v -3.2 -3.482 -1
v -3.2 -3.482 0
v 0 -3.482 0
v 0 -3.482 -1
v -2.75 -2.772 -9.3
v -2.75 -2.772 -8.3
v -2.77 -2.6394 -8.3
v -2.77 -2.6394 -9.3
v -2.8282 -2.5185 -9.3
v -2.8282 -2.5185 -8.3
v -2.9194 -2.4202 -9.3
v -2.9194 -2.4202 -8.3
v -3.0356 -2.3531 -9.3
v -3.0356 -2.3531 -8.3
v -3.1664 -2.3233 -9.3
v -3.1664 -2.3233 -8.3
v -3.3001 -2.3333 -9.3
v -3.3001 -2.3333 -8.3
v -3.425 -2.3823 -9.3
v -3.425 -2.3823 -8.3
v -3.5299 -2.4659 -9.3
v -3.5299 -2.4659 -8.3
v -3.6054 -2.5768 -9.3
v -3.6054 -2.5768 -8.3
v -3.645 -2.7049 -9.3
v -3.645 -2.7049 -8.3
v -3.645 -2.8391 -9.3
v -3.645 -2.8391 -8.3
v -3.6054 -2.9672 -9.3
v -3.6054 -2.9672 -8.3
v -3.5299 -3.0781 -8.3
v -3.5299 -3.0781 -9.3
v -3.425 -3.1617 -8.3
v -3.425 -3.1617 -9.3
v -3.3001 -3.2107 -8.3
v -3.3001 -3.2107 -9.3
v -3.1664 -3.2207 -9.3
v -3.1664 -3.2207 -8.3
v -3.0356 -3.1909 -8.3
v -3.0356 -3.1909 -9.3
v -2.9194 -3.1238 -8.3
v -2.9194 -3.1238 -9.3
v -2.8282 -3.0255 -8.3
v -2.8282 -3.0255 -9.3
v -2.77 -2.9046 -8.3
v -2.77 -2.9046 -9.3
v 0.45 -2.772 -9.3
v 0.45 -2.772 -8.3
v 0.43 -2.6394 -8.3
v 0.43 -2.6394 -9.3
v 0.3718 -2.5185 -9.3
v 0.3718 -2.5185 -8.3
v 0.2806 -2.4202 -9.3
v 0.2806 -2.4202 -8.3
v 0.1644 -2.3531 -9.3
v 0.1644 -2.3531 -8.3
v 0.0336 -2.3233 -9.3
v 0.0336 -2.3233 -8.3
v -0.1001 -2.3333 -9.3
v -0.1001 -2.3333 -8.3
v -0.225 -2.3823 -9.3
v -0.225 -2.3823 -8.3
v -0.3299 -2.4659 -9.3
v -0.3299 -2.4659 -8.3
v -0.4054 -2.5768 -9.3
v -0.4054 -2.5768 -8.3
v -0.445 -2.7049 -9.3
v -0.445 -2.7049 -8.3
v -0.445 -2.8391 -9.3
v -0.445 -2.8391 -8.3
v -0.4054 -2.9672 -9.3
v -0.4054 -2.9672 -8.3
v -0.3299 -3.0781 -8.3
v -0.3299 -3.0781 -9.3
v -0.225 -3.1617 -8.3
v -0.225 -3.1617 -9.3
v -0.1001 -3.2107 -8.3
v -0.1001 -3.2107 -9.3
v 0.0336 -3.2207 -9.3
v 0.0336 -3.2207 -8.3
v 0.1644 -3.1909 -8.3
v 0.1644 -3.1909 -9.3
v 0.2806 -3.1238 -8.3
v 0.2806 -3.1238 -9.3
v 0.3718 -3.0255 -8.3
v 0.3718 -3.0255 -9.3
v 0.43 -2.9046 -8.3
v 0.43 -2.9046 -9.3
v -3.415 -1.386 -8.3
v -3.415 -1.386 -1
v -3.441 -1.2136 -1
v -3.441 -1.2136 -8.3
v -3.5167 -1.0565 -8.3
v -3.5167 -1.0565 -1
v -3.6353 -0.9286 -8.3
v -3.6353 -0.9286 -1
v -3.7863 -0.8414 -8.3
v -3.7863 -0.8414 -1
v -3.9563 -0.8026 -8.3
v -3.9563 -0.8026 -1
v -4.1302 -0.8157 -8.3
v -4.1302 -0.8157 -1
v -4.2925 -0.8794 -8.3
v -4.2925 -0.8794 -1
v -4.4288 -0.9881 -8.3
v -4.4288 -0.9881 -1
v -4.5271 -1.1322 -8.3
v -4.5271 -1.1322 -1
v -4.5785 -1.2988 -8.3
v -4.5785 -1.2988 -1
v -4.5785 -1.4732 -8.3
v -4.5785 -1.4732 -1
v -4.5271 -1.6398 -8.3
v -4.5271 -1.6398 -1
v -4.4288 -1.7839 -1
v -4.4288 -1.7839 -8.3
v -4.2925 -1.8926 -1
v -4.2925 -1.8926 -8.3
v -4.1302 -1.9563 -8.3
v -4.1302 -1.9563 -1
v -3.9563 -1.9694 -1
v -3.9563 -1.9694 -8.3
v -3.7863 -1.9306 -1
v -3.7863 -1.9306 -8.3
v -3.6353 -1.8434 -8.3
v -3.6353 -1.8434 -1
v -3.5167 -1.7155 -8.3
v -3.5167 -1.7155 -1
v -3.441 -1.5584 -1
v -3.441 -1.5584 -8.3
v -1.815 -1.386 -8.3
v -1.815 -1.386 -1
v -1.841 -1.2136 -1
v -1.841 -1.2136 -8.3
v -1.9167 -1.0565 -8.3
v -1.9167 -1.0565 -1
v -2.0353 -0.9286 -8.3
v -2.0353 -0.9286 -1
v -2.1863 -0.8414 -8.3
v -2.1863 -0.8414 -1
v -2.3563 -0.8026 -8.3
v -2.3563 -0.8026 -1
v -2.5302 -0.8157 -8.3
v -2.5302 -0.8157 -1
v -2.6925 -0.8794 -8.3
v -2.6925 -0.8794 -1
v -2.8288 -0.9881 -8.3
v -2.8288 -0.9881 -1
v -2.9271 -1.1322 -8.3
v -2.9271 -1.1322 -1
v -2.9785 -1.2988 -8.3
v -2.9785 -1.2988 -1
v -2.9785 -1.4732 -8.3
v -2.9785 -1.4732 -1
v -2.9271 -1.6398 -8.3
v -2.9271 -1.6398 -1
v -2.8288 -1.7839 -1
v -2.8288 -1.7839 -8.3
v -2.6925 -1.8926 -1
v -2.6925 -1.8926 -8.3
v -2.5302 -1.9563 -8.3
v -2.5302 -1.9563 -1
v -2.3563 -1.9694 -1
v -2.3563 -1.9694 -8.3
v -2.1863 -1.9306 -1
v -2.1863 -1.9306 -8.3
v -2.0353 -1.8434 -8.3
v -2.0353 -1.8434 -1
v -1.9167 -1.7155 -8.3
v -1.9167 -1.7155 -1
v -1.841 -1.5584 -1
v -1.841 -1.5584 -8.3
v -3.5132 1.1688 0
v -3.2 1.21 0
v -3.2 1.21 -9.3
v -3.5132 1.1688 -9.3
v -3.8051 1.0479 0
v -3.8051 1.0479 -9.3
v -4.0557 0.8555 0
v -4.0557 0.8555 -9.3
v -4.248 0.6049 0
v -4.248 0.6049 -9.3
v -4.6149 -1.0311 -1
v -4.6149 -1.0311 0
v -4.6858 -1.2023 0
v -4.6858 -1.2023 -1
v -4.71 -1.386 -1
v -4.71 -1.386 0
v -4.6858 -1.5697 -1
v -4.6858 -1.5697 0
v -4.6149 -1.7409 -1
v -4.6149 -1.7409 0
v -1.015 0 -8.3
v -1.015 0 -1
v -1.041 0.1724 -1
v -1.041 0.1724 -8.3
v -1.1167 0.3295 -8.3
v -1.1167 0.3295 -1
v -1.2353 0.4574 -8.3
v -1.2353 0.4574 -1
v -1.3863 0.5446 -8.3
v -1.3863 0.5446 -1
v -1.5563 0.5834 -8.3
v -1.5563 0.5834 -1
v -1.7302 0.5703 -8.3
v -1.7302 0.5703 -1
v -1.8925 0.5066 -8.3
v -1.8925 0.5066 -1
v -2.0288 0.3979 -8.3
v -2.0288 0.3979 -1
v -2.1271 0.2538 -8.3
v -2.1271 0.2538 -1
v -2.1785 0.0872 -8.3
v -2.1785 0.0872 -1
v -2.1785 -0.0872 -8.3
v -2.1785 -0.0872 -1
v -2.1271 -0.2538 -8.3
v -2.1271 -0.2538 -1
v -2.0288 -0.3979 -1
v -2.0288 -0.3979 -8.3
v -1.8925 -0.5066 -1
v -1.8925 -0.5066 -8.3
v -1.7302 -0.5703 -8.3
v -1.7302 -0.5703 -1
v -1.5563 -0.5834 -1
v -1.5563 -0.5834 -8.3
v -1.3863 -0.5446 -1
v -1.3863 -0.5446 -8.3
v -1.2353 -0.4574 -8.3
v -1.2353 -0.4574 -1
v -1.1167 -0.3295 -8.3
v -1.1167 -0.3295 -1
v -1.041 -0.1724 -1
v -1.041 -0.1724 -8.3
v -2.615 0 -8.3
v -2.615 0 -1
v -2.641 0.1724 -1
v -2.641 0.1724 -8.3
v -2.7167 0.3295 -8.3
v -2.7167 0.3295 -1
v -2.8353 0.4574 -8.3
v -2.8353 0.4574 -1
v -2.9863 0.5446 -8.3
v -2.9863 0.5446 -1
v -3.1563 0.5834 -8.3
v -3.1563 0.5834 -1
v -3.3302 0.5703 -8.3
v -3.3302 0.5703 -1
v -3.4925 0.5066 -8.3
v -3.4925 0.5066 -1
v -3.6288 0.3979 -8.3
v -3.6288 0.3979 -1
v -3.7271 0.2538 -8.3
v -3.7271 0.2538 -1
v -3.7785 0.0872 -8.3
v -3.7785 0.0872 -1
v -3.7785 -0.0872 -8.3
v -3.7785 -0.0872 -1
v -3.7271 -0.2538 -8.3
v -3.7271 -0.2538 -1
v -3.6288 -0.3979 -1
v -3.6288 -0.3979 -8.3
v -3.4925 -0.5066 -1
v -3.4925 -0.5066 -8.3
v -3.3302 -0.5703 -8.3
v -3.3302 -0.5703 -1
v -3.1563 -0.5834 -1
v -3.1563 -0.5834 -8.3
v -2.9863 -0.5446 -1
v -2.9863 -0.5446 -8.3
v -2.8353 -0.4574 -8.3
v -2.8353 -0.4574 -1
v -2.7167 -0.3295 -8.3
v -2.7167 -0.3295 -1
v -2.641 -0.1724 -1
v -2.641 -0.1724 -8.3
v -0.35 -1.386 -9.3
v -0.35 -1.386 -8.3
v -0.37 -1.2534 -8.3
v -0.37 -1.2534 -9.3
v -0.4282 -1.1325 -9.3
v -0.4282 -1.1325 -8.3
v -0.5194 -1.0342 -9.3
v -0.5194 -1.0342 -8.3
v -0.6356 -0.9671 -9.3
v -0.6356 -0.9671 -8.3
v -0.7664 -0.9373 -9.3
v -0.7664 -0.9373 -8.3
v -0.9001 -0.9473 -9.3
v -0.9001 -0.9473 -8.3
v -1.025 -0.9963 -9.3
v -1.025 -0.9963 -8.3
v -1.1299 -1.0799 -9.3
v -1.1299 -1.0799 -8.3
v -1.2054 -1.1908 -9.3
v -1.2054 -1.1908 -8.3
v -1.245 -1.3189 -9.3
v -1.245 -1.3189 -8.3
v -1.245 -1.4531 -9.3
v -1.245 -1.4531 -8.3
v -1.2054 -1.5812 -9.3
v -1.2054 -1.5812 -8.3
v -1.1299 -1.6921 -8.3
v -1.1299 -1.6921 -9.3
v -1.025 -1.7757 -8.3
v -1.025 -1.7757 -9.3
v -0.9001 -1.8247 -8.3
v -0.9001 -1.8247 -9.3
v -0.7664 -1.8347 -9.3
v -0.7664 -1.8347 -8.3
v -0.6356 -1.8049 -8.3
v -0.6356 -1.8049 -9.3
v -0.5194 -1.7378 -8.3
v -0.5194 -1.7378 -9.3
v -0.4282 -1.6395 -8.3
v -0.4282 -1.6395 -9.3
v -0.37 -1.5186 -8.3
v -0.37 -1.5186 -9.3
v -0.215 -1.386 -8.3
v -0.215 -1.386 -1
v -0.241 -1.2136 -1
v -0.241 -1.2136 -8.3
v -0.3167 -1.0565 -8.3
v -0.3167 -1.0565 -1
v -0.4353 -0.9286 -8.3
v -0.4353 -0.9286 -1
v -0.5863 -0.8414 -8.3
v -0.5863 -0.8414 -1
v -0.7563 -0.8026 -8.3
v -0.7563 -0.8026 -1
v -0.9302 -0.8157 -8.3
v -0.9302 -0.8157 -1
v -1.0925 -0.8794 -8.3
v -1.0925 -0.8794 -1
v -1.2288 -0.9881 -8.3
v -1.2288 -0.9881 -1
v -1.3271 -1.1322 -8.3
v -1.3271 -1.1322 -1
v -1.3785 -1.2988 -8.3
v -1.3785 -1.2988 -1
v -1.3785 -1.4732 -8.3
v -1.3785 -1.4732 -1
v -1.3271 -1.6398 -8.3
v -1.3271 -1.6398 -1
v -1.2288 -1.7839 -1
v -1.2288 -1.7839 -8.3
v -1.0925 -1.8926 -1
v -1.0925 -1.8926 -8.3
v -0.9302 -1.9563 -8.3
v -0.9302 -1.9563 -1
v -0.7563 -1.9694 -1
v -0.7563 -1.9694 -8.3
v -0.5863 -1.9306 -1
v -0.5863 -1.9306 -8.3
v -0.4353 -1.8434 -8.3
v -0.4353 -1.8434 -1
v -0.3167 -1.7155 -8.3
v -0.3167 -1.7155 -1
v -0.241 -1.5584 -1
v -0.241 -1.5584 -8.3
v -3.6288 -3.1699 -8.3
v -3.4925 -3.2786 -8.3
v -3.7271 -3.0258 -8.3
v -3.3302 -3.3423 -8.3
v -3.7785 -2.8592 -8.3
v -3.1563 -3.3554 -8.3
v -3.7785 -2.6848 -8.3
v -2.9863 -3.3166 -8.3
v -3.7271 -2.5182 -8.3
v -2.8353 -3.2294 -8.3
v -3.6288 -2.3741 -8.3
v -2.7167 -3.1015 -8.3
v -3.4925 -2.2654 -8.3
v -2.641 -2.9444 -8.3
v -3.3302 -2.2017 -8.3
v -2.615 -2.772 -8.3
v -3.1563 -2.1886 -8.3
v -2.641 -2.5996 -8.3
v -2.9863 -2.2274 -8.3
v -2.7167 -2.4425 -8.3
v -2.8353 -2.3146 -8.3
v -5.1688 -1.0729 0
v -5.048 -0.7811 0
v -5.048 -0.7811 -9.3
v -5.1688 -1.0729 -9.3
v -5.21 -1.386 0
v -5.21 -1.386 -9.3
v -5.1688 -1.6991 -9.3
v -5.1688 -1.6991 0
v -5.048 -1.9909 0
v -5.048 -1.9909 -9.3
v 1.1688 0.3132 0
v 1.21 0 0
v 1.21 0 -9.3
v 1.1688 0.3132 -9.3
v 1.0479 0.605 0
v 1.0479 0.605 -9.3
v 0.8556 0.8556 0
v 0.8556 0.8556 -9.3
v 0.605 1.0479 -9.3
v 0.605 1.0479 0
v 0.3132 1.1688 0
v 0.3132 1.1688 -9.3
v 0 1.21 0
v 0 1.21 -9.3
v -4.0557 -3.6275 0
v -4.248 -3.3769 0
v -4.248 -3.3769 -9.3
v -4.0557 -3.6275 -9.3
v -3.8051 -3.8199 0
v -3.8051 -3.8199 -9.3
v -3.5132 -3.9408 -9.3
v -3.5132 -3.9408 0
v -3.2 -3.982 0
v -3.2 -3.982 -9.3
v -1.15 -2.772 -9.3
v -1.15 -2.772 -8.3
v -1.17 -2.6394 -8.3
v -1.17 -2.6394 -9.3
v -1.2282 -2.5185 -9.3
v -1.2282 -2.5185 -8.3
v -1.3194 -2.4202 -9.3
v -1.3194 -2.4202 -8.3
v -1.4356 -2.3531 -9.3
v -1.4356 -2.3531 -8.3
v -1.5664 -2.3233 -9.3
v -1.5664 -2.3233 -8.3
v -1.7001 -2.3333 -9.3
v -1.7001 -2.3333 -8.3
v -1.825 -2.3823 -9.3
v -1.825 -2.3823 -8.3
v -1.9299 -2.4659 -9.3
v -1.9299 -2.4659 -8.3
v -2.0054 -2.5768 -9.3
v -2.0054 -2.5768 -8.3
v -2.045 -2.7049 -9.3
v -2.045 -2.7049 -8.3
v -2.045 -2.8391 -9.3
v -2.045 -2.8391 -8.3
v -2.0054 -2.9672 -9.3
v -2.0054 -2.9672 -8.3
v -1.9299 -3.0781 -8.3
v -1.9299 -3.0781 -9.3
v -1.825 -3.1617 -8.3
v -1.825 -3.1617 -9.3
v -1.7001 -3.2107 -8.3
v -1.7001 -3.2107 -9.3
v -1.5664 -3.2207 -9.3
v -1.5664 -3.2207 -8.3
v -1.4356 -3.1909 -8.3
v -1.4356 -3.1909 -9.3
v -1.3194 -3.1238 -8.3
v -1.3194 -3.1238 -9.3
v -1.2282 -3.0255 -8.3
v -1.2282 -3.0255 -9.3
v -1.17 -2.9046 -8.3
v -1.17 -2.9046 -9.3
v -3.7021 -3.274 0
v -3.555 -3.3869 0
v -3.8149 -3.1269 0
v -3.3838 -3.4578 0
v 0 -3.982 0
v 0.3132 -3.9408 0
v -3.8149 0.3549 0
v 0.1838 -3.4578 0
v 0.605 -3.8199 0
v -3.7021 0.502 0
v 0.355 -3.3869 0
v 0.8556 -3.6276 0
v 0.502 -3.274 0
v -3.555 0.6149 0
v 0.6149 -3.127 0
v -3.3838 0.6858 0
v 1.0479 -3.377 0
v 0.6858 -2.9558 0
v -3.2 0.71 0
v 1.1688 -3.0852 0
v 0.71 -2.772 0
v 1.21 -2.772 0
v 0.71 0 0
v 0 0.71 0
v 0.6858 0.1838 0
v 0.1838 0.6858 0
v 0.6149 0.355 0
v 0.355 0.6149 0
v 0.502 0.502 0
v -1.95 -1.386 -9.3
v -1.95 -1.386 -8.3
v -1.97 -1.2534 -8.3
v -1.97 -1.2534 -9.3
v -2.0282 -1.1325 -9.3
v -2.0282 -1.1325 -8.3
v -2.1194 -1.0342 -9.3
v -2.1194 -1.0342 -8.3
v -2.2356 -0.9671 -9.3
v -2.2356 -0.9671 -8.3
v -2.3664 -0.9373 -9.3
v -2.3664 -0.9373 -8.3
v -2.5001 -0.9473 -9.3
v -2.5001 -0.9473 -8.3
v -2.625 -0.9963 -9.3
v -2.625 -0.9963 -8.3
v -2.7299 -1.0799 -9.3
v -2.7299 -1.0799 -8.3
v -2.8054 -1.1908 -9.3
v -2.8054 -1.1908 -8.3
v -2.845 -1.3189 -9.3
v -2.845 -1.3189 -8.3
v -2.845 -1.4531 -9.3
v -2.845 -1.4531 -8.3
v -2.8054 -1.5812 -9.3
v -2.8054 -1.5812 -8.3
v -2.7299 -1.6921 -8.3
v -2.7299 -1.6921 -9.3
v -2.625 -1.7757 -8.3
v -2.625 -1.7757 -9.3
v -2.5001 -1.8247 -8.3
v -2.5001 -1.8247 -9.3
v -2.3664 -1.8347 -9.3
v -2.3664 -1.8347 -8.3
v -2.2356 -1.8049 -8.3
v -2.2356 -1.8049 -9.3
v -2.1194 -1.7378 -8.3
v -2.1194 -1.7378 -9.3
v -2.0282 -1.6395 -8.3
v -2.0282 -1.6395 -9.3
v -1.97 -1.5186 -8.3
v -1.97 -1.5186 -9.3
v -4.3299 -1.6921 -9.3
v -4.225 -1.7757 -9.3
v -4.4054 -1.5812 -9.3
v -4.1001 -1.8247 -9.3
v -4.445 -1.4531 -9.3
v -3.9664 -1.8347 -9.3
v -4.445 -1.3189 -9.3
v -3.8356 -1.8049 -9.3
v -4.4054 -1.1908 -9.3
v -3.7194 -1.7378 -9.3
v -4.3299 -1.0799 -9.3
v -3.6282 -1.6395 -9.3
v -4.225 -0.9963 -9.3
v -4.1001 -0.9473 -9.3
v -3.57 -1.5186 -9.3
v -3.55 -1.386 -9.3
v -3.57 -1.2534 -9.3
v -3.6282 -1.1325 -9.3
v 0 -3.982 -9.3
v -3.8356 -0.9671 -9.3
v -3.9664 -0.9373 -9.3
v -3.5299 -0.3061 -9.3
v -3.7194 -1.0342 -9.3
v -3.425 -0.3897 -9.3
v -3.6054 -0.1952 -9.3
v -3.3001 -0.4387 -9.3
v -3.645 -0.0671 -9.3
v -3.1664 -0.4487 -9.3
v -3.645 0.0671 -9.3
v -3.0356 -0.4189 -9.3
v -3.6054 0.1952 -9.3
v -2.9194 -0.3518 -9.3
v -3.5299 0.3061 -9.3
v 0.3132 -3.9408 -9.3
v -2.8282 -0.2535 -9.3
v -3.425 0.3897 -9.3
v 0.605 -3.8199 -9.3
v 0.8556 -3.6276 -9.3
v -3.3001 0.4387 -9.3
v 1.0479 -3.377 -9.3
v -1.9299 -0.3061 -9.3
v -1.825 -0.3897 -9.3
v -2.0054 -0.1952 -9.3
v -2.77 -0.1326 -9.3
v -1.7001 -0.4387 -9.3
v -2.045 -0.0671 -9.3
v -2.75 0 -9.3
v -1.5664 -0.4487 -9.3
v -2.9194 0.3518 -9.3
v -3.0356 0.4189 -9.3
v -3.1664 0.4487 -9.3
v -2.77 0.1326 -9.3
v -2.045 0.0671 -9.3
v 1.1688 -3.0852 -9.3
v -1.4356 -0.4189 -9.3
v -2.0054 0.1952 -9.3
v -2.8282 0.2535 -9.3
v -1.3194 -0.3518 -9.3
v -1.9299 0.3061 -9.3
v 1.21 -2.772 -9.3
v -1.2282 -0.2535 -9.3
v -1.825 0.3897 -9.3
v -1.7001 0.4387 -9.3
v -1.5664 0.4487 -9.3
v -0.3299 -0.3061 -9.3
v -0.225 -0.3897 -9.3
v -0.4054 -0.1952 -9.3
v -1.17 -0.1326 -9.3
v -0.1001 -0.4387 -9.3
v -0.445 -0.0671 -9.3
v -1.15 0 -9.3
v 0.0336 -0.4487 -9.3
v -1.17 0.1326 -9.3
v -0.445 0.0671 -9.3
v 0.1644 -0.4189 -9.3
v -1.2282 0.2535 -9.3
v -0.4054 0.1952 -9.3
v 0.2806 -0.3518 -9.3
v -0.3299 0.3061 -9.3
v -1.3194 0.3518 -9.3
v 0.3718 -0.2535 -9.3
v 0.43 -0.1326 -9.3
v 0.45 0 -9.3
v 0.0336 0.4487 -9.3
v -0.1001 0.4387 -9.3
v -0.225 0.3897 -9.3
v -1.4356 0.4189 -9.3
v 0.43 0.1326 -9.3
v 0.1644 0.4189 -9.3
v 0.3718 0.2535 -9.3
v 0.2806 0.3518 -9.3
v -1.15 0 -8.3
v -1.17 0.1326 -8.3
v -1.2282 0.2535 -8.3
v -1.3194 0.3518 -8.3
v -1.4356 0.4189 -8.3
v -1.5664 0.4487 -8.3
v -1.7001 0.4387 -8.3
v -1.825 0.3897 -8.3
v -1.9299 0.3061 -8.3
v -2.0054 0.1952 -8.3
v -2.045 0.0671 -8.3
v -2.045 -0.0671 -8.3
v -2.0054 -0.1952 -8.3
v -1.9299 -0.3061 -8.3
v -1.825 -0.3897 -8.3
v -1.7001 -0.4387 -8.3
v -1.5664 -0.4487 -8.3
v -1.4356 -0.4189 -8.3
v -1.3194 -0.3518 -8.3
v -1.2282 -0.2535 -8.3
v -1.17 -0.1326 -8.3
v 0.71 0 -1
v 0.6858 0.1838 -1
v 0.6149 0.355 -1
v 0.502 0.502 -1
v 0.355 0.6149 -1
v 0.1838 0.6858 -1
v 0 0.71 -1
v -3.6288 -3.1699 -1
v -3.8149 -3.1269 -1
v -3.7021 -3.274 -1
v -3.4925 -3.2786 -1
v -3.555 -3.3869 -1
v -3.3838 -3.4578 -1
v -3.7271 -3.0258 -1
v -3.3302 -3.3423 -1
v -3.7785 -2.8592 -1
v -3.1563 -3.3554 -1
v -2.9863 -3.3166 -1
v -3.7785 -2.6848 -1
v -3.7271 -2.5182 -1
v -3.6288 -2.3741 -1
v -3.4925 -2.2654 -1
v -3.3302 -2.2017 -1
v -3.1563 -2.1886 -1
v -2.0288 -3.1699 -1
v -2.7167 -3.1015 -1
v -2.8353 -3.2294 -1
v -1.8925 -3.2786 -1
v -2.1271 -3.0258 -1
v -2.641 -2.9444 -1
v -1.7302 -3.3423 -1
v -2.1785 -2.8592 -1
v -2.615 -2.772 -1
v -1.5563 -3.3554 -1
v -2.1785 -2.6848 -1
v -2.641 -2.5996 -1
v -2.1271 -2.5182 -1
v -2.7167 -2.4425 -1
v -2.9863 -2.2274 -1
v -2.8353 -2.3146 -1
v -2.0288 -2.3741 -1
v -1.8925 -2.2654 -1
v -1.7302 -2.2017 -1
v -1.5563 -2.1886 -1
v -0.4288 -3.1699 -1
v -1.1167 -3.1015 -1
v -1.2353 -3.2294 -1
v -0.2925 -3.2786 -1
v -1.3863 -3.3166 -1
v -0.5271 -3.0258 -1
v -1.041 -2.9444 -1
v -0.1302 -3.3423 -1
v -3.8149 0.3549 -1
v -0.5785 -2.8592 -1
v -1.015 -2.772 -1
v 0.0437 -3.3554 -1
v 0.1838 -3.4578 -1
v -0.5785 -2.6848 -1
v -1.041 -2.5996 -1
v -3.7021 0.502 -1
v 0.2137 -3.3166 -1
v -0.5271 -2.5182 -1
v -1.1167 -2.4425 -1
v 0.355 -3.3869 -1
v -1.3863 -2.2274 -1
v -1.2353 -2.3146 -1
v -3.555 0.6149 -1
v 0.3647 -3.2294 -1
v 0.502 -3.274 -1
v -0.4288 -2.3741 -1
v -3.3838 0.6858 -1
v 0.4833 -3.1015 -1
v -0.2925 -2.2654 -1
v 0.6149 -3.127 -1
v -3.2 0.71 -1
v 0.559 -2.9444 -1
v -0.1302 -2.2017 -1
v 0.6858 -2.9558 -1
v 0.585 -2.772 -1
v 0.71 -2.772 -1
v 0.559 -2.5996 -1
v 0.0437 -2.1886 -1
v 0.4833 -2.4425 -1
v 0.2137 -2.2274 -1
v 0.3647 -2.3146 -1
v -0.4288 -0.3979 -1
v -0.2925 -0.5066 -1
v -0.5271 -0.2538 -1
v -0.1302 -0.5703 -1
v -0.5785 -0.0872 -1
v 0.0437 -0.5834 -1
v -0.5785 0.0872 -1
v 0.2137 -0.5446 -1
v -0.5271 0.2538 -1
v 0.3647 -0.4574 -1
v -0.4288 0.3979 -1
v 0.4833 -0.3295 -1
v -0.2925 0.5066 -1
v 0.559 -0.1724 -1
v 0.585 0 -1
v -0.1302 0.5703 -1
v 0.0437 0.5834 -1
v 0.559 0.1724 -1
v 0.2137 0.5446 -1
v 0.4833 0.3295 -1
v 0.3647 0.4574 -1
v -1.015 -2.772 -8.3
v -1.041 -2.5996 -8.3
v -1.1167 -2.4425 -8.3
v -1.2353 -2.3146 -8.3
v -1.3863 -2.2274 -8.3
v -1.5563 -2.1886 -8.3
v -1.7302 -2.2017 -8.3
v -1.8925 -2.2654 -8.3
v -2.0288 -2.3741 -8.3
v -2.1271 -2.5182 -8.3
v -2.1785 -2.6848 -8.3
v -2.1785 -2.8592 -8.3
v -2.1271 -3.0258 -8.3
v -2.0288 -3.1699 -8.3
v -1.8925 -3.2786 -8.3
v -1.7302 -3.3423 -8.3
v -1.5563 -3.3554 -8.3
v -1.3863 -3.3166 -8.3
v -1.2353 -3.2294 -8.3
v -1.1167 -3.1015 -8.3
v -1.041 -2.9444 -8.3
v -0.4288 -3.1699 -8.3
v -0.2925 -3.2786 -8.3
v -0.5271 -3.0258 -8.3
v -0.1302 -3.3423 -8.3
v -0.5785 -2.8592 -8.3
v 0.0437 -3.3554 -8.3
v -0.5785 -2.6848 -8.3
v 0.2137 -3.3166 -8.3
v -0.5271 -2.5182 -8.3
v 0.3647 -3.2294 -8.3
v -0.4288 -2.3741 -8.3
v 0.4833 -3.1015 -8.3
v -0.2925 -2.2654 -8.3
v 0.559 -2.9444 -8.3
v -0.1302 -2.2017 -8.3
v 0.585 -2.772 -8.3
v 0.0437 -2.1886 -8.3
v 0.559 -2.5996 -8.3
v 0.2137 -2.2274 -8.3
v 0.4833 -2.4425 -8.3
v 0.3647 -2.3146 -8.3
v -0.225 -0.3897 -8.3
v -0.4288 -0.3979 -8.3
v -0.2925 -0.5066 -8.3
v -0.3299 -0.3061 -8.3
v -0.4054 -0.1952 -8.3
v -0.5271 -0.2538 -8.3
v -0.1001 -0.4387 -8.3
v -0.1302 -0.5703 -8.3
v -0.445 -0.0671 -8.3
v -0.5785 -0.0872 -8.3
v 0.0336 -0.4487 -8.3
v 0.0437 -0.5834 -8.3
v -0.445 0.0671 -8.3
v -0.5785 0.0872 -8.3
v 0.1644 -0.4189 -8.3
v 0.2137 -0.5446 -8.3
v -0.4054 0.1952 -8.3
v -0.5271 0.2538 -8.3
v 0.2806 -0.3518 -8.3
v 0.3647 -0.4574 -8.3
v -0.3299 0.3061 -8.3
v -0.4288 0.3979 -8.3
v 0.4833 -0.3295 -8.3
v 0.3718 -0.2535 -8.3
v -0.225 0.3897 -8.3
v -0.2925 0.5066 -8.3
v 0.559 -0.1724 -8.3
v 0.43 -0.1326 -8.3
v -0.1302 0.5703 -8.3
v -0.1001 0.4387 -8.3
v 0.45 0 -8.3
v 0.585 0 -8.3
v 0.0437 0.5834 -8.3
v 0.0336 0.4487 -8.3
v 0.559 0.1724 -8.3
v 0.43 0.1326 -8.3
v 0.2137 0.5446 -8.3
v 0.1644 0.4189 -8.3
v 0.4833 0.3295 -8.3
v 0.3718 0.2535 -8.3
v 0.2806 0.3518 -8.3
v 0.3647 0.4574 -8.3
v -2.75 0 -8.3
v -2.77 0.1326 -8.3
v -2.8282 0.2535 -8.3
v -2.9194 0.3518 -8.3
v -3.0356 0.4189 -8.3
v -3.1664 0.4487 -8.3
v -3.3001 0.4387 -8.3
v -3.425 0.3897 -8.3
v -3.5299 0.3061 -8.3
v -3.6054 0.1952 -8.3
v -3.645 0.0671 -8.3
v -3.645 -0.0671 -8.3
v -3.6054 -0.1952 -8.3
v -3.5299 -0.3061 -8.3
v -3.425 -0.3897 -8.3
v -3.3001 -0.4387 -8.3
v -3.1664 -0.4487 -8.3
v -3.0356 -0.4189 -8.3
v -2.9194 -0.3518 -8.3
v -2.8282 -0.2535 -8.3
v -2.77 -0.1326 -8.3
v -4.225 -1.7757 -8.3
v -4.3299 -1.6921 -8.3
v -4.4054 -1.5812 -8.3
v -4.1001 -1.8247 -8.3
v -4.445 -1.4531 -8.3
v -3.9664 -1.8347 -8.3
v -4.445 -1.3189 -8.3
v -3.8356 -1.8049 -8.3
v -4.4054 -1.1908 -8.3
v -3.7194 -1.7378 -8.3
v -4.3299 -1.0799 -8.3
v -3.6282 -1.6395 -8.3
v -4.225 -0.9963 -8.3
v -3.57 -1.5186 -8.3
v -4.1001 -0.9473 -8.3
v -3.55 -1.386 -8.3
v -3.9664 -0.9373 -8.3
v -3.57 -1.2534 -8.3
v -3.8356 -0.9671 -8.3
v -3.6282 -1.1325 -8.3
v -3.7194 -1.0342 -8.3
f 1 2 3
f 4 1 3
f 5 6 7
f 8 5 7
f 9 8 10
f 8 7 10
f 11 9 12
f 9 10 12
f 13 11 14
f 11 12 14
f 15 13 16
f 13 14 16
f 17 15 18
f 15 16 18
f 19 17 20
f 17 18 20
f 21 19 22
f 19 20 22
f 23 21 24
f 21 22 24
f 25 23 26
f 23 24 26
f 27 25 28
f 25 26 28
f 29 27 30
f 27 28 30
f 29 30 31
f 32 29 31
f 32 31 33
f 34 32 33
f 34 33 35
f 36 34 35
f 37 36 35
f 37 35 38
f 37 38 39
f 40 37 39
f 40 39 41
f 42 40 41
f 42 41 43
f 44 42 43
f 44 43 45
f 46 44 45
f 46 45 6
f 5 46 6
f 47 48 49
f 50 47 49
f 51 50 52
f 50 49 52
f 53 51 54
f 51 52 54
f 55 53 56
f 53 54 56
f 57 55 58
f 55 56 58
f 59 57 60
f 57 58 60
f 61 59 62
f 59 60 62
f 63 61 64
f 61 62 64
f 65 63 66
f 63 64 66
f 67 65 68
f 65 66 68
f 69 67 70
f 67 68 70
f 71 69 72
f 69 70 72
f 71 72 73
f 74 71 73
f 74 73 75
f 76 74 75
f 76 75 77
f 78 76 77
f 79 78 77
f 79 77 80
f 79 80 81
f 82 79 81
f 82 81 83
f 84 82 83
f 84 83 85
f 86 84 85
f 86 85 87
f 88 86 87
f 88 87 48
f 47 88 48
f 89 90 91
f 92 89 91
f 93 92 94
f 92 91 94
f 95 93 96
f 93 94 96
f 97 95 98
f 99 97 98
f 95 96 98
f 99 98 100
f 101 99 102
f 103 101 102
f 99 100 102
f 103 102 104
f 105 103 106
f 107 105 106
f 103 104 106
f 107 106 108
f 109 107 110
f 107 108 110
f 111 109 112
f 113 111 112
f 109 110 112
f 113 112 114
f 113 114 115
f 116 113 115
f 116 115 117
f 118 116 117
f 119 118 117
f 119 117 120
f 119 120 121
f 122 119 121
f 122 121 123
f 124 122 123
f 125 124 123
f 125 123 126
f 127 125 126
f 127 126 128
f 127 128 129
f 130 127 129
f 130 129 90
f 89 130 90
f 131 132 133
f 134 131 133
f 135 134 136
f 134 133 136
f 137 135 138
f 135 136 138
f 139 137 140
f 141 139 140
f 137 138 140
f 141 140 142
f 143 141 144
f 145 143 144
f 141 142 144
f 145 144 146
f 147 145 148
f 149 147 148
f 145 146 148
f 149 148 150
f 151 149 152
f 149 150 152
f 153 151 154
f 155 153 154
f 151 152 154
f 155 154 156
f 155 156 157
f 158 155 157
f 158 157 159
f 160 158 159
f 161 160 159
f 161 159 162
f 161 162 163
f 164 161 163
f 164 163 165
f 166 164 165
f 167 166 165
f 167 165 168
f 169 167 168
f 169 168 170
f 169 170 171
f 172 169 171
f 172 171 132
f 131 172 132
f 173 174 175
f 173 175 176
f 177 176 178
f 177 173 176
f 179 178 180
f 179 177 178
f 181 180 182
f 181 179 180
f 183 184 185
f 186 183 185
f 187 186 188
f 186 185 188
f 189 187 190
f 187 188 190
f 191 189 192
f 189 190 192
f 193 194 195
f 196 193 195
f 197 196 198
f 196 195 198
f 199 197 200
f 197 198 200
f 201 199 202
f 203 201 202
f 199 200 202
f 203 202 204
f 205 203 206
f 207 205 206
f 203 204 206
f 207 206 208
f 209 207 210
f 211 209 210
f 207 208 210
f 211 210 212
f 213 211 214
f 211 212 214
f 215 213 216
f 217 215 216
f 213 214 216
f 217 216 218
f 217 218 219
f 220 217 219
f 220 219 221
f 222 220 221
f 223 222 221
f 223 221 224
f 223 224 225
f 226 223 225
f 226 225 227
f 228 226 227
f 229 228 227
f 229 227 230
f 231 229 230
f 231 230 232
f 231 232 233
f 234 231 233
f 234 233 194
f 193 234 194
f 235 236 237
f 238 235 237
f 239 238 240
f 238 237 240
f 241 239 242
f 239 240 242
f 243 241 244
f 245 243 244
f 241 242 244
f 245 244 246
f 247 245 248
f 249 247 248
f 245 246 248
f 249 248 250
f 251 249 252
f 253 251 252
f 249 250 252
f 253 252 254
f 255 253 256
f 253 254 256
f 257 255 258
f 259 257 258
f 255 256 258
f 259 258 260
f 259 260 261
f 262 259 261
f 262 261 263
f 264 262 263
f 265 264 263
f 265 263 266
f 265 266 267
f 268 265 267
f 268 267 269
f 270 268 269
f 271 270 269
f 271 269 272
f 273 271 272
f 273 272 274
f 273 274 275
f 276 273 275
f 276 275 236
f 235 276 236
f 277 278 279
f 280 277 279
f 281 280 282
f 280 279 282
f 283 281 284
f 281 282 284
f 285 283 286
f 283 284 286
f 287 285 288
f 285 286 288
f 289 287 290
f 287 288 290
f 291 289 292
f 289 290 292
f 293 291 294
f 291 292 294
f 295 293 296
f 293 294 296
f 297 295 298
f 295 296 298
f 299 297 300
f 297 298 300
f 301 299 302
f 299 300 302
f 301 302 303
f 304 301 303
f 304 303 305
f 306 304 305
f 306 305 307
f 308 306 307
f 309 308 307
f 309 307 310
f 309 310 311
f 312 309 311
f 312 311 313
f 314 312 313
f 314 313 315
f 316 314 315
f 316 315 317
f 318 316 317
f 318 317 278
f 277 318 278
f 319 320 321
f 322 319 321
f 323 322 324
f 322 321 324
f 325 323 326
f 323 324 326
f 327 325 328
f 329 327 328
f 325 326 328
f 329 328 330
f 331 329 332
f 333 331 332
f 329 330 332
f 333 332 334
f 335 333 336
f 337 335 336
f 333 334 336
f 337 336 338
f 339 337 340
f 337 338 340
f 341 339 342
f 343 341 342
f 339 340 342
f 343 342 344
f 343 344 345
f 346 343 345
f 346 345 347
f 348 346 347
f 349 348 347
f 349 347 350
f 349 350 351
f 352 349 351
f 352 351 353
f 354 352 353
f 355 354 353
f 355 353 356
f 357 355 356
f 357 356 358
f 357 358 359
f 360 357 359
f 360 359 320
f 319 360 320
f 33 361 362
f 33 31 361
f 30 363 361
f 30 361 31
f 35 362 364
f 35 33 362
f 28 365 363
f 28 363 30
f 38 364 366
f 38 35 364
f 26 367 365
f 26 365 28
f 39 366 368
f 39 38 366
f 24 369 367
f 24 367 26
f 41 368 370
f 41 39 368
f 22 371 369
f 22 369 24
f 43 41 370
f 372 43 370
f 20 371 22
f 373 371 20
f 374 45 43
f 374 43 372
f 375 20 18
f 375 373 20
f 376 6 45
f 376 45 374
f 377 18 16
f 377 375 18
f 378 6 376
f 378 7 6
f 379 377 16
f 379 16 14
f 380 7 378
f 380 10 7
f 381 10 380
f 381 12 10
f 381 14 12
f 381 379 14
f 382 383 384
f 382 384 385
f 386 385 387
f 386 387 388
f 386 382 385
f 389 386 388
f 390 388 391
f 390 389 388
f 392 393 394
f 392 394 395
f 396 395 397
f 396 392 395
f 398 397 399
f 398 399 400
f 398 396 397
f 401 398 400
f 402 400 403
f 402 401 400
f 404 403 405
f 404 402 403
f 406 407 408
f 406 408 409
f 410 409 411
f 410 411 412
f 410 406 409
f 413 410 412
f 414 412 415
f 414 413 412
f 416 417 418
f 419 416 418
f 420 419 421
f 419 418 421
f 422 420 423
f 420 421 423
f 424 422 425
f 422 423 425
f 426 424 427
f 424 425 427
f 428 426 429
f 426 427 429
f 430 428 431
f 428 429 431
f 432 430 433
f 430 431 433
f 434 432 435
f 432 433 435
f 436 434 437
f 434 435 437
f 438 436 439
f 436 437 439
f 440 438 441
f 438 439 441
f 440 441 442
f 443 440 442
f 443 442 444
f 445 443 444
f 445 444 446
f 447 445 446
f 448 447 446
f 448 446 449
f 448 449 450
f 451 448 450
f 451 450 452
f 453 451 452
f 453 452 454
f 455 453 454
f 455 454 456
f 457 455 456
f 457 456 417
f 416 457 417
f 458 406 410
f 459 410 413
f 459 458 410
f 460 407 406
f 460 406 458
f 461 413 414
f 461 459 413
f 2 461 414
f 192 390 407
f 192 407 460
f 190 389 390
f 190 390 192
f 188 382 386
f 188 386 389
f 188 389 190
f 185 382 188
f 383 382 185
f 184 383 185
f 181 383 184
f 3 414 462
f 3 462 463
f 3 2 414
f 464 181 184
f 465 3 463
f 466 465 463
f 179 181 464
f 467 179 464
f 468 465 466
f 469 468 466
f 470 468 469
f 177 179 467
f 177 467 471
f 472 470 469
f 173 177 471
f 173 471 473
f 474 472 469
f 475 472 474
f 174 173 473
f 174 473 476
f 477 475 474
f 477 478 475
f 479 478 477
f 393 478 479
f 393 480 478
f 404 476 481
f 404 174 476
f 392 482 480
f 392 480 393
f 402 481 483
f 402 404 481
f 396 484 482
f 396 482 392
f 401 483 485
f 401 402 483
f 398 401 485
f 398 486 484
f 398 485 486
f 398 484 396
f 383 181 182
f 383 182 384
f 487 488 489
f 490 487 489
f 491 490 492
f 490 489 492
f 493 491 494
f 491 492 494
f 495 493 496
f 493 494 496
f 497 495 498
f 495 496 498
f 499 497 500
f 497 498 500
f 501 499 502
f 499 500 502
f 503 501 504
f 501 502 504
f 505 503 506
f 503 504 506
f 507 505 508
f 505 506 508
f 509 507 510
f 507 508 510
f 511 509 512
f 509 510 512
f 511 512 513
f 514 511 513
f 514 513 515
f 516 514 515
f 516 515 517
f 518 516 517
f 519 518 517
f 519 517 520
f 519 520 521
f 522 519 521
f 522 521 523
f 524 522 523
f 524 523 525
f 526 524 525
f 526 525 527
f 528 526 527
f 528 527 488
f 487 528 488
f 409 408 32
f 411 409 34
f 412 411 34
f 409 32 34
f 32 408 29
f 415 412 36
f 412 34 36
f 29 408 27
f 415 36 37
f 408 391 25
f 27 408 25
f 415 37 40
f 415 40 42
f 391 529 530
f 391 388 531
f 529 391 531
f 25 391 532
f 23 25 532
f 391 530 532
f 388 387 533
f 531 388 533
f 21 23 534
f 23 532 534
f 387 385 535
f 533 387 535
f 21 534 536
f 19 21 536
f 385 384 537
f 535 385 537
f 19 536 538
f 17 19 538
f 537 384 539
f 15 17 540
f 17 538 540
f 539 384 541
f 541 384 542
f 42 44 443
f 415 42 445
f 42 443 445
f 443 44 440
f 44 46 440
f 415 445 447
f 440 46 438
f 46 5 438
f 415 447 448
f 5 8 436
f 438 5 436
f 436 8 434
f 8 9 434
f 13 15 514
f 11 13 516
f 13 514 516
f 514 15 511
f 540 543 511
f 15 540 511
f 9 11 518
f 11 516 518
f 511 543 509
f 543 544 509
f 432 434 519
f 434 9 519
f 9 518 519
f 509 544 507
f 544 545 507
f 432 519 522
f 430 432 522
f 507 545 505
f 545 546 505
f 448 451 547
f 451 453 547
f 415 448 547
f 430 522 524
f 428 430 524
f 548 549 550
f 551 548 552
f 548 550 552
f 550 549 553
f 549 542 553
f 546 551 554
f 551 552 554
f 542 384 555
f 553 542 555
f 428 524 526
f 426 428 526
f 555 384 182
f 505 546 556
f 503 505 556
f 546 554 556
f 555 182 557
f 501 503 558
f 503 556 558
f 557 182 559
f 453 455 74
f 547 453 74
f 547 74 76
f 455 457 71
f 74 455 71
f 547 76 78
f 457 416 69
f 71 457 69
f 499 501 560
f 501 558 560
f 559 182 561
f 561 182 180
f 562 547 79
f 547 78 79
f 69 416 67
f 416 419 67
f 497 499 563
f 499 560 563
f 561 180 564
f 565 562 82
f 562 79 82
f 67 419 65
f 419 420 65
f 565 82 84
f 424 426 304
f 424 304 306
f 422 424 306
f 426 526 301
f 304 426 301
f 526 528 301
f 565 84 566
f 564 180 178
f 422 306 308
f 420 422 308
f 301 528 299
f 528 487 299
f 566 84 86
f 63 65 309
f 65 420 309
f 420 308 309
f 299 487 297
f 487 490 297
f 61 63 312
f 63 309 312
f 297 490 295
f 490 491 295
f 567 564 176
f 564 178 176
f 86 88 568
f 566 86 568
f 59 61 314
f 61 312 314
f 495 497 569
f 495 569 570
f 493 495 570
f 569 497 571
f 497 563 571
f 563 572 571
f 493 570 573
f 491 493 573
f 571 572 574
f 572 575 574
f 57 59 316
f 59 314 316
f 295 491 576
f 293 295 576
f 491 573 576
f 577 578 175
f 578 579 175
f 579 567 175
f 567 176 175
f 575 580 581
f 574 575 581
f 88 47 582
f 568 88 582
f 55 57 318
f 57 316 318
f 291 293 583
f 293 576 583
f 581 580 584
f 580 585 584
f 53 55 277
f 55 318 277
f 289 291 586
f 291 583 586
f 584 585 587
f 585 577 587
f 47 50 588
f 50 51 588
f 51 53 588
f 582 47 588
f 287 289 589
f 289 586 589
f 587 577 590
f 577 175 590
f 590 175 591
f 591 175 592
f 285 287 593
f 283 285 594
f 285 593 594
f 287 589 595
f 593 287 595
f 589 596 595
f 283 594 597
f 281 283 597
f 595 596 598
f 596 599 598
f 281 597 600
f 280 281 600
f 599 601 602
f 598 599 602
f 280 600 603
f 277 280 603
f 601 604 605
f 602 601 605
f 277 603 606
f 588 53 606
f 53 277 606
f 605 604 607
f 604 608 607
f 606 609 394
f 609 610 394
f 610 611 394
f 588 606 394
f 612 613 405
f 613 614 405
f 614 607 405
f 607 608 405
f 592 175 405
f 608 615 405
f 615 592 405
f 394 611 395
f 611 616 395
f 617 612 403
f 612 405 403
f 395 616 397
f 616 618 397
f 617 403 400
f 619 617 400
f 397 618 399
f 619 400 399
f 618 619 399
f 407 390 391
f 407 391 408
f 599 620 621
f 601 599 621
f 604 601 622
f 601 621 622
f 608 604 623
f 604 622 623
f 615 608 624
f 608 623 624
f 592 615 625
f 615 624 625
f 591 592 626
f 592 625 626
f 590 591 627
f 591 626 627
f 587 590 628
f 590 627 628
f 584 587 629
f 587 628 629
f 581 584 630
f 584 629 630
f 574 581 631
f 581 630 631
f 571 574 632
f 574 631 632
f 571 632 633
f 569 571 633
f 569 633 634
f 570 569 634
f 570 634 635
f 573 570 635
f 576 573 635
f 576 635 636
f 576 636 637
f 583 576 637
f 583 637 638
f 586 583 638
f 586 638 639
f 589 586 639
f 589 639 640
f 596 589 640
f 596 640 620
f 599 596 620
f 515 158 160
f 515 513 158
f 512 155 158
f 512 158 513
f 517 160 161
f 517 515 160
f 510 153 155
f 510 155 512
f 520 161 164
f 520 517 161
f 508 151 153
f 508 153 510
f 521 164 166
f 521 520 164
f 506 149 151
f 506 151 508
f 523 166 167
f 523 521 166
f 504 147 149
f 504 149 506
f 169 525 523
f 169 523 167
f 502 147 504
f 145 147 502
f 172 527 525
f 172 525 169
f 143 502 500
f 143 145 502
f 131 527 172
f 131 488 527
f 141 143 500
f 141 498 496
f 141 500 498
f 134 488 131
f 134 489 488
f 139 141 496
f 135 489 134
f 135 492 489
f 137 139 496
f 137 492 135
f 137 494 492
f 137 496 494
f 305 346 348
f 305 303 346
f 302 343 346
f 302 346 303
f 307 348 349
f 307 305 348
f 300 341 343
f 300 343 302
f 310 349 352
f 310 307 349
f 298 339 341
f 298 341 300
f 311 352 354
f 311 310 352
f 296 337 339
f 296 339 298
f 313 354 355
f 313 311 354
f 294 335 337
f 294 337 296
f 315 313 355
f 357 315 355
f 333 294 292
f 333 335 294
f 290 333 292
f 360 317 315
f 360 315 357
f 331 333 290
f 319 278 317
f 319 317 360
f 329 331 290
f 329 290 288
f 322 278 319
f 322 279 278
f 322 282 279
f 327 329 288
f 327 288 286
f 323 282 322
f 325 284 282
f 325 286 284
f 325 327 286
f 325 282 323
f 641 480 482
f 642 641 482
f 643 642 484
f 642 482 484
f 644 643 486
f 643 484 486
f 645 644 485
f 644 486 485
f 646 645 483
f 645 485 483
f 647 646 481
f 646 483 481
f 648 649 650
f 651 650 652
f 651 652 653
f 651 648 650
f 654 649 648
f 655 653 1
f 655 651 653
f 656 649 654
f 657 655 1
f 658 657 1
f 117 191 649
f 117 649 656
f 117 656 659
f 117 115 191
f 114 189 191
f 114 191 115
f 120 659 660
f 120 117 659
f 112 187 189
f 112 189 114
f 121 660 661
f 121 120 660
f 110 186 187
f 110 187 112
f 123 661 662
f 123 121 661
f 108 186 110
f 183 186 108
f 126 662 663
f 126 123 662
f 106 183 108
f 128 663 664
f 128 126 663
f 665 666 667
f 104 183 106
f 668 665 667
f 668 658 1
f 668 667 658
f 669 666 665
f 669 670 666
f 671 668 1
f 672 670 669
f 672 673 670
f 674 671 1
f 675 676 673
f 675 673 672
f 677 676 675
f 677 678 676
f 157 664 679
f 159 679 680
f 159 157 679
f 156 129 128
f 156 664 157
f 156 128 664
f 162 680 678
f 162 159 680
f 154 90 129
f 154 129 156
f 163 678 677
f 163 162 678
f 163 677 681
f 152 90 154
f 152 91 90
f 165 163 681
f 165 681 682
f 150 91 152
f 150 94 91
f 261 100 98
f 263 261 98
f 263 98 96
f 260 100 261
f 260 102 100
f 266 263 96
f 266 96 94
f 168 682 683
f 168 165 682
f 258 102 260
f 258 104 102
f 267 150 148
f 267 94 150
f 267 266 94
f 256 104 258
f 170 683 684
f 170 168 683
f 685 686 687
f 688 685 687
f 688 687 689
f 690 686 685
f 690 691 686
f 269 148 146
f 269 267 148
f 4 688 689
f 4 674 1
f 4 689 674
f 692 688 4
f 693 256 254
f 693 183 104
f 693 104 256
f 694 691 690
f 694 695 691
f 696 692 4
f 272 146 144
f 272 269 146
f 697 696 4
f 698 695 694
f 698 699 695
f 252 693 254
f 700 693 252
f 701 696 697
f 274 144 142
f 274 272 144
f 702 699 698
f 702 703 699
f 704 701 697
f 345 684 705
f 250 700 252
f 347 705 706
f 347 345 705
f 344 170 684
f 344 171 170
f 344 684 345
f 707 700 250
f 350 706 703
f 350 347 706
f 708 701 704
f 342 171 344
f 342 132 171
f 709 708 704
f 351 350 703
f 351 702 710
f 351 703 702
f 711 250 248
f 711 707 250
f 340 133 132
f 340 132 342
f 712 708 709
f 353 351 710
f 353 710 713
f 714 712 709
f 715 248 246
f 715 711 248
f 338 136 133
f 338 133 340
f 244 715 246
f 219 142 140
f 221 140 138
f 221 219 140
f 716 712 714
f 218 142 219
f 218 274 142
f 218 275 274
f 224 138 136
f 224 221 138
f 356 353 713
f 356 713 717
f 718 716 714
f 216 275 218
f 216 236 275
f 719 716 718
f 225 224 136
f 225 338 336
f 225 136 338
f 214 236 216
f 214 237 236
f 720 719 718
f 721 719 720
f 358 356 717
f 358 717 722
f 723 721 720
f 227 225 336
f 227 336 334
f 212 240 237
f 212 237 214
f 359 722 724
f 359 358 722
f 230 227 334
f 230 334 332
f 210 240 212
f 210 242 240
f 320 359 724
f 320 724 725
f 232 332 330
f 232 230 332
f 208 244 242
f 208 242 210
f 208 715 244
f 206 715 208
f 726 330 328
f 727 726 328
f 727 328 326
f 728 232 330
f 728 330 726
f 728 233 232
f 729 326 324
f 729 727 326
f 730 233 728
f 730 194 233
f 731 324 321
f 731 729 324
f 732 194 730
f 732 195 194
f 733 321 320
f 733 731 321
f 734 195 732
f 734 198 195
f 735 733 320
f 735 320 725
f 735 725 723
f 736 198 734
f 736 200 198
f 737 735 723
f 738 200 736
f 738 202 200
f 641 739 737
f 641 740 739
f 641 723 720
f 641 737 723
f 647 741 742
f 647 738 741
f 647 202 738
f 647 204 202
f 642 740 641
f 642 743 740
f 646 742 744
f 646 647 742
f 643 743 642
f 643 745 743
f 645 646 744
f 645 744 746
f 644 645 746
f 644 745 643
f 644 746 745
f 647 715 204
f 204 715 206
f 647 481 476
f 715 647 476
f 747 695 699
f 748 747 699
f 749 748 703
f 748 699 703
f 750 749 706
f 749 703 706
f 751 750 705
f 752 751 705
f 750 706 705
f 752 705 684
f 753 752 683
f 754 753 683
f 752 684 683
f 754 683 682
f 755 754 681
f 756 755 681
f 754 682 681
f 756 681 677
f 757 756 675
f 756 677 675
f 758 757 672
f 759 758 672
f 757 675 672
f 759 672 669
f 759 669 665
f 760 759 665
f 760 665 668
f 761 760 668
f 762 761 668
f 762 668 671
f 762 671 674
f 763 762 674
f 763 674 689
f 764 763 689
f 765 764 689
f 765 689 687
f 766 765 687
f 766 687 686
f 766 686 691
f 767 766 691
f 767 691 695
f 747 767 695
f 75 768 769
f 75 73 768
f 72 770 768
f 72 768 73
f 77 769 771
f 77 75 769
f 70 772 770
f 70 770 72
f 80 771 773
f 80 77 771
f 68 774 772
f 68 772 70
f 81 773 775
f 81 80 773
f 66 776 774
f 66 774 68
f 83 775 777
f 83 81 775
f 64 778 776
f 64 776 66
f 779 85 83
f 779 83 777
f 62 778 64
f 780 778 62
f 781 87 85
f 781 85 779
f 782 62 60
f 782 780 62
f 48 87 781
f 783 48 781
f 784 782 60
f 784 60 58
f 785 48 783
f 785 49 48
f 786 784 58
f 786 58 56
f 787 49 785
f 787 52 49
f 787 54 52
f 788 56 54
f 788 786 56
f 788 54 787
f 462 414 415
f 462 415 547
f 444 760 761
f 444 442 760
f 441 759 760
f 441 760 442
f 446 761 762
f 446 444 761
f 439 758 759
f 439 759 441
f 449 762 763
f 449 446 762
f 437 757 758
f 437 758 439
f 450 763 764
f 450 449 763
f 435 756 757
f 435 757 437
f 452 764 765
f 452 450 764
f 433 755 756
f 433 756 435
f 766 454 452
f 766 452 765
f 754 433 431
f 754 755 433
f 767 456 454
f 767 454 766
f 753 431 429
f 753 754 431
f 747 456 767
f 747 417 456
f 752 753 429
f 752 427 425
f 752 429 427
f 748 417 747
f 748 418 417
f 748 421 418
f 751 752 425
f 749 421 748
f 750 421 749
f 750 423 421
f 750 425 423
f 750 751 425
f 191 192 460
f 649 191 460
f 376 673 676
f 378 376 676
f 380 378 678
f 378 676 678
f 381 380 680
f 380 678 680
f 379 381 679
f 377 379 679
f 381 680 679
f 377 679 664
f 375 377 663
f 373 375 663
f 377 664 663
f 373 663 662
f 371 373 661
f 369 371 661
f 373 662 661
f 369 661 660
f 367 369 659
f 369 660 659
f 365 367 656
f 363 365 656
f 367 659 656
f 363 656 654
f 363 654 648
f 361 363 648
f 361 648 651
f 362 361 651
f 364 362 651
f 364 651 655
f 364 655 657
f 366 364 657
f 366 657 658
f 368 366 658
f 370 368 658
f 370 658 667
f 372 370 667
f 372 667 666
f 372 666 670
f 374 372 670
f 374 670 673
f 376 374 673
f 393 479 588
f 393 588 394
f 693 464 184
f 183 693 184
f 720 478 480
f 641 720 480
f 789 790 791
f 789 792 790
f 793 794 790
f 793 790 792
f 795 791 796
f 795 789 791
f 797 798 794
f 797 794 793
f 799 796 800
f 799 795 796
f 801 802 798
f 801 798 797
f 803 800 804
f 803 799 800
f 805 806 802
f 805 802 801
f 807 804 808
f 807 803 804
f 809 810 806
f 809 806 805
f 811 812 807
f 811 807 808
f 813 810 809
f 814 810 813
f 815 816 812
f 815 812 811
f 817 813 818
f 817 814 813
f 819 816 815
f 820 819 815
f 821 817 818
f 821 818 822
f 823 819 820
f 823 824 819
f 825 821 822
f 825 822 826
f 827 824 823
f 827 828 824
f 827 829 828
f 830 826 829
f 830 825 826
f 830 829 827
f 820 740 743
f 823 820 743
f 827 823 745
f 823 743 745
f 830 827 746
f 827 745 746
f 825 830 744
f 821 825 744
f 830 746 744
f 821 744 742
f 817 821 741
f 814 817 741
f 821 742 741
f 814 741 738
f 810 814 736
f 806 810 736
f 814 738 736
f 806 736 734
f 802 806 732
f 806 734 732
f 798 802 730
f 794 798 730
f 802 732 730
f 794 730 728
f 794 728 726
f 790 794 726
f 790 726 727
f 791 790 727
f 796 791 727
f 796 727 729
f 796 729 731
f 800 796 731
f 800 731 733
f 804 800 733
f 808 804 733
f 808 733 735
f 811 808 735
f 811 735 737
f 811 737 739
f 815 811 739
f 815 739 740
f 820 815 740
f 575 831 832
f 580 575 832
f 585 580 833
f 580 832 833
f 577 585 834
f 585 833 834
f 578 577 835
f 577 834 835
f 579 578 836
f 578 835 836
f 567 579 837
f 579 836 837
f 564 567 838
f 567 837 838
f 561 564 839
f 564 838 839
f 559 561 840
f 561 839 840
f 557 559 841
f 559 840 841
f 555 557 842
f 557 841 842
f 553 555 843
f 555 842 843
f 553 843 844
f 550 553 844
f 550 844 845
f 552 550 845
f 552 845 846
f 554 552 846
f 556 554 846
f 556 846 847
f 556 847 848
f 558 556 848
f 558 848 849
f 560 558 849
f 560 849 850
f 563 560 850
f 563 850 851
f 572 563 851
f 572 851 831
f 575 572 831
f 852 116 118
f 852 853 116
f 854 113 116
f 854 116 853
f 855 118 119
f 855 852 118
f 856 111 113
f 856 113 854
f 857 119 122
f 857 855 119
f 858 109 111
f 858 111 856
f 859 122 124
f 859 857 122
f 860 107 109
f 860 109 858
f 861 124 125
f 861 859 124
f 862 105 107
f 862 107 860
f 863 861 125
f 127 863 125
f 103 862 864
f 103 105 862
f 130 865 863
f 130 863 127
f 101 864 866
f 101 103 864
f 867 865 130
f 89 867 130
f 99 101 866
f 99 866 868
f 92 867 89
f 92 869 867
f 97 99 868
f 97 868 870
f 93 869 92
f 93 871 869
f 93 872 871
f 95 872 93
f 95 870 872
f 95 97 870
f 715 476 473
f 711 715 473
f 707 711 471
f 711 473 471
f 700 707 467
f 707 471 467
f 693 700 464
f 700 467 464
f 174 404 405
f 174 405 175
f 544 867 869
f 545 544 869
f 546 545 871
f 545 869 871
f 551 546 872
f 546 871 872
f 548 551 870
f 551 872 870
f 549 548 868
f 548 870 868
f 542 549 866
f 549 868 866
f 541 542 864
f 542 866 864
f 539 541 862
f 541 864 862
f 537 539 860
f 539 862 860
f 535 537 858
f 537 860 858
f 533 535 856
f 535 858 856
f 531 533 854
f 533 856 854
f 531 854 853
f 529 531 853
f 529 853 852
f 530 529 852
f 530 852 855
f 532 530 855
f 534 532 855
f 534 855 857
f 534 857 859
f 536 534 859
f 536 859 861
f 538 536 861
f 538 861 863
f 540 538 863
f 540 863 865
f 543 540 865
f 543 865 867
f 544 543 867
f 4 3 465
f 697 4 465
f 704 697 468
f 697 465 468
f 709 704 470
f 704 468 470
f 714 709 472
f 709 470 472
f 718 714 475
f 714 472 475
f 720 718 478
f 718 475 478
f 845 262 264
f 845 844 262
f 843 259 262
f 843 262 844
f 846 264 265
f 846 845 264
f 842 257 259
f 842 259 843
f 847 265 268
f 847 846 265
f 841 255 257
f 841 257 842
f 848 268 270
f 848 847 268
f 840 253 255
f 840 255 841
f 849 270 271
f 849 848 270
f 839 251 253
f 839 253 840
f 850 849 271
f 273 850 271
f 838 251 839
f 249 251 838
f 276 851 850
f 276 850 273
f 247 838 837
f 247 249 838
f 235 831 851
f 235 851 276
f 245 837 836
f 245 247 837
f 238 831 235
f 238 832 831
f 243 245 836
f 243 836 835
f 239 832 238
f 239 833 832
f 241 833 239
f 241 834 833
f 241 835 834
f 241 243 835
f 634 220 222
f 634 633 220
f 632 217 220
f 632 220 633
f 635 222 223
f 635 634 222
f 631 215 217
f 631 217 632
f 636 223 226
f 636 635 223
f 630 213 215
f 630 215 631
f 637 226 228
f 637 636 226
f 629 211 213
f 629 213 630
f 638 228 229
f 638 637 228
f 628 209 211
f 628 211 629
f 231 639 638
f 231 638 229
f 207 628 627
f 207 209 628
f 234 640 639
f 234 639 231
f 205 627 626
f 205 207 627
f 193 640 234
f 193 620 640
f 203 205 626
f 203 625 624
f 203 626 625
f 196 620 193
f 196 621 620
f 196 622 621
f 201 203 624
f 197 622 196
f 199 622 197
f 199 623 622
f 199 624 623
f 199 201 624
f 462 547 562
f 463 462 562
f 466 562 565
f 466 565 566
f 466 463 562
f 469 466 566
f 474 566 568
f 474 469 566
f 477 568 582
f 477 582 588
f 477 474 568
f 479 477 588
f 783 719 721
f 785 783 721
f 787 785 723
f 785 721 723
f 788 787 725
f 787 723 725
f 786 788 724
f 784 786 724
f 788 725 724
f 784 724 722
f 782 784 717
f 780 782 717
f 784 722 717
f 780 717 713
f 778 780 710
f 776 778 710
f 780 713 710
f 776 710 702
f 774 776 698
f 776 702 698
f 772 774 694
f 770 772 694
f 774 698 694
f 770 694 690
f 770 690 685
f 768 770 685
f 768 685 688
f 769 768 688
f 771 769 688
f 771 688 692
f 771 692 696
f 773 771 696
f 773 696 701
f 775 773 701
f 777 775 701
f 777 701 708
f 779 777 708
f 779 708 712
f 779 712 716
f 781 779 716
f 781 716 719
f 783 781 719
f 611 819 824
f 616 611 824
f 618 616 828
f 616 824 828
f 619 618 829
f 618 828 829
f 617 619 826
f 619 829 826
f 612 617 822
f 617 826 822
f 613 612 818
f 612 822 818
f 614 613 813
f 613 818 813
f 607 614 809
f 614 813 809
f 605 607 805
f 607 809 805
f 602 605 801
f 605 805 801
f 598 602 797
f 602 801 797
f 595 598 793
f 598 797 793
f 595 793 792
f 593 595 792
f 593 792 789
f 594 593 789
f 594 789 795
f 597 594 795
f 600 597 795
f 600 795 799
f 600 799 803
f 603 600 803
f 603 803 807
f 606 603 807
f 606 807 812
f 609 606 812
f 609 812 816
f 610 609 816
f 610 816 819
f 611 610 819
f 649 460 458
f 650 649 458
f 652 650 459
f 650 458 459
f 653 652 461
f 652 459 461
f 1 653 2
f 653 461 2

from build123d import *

# Parameters (mm, degrees)
F0_R     = 0.585
F1_DEPTH = 9.3
F2_DEPTH = 1
F3_DEPTH = 8.3
F4_R     = 0.45
F5_DEPTH = 9.301


# Not quite as in the source:
# - a feature names something its author has since deleted; it is built from what else it names


with BuildPart() as f1:
    # F0 (on Top) → F1 (new body)
    with BuildSketch(Plane.XY):
        with BuildLine():
            Line((0, 1.21), (-3.2, 1.21))
            ThreePointArc((-3.2, 1.21), (-3.8050588257, 1.0478567734), (-4.2479586591, 0.6048823429))
            Line((-4.2479586591, 0.6048823429), (-5.0479586591, -0.7811176571))
            ThreePointArc((-5.0479586591, -0.7811176571), (-5.21, -1.386), (-5.0479586591, -1.9908823429))
            Line((-5.0479586591, -1.9908823429), (-4.2479586591, -3.3768823429))
            ThreePointArc((-4.2479586591, -3.3768823429), (-3.8050588257, -3.8198567734), (-3.2, -3.982))
            Line((-3.2, -3.982), (0, -3.982))
            ThreePointArc((0, -3.982), (0.8555992052, -3.6275992052), (1.21, -2.772))
            Line((1.21, -2.772), (1.21, 0))
            ThreePointArc((1.21, 0), (0.8555992052, 0.8555992052), (0, 1.21))
        make_face()
        with BuildLine():
            ThreePointArc((-3.8149178909, 0.3549309616), (-3.5550345175, 0.6148581067), (-3.2, 0.71))
            Line((-3.2, 0.71), (0, 0.71))
            ThreePointArc((0, 0.71), (0.5020458146, 0.5020458146), (0.71, 0))
            Line((0.71, 0), (0.71, -2.772))
            ThreePointArc((0.71, -2.772), (0.5020458146, -3.2740458146), (0, -3.482))
            Line((0, -3.482), (-3.2, -3.482))
            ThreePointArc((-3.2, -3.482), (-3.5550345175, -3.3868581067), (-3.8149178909, -3.1269309616))
            Line((-3.8149178909, -3.1269309616), (-4.6149178909, -1.7409309616))
            ThreePointArc((-4.6149178909, -1.7409309616), (-4.71, -1.386), (-4.6149178909, -1.0310690384))
            Line((-4.6149178909, -1.0310690384), (-3.8149178909, 0.3549309616))
        make_face(mode=Mode.SUBTRACT)
        with BuildLine():
            Line((0, 0.71), (-3.2, 0.71))
            ThreePointArc((-3.2, 0.71), (-3.5550345175, 0.6148581067), (-3.8149178909, 0.3549309616))
            Line((-3.8149178909, 0.3549309616), (-4.6149178909, -1.0310690384))
            ThreePointArc((-4.6149178909, -1.0310690384), (-4.71, -1.386), (-4.6149178909, -1.7409309616))
            Line((-4.6149178909, -1.7409309616), (-3.8149178909, -3.1269309616))
            ThreePointArc((-3.8149178909, -3.1269309616), (-3.5550345175, -3.3868581067), (-3.2, -3.482))
            Line((-3.2, -3.482), (0, -3.482))
            ThreePointArc((0, -3.482), (0.5020458146, -3.2740458146), (0.71, -2.772))
            Line((0.71, -2.772), (0.71, 0))
            ThreePointArc((0.71, 0), (0.5020458146, 0.5020458146), (0, 0.71))
        make_face()
        with Locations((-3.2, -2.772)):
            Circle(F0_R, mode=Mode.SUBTRACT)
        with Locations((-4, -1.386)):
            Circle(F0_R, mode=Mode.SUBTRACT)
        with Locations((-2.4, -1.386)):
            Circle(F0_R, mode=Mode.SUBTRACT)
        with Locations((-1.6, -2.772)):
            Circle(F0_R, mode=Mode.SUBTRACT)
        with Locations((0, -2.772)):
            Circle(F0_R, mode=Mode.SUBTRACT)
        with Locations((-0.8, -1.386)):
            Circle(F0_R, mode=Mode.SUBTRACT)
        with Locations((-3.2, 0)):
            Circle(F0_R, mode=Mode.SUBTRACT)
        with Locations((-1.6, 0)):
            Circle(F0_R, mode=Mode.SUBTRACT)
        Circle(F0_R, mode=Mode.SUBTRACT)
        with Locations((-4, -1.386)):
            Circle(F0_R)
        with Locations((-3.2, 0)):
            Circle(F0_R)
        with Locations((-1.6, 0)):
            Circle(F0_R)
        with Locations((-2.4, -1.386)):
            Circle(F0_R)
        with Locations((-3.2, -2.772)):
            Circle(F0_R)
        with Locations((-1.6, -2.772)):
            Circle(F0_R)
        with Locations((-0.8, -1.386)):
            Circle(F0_R)
        Circle(F0_R)
        with Locations((0, -2.772)):
            Circle(F0_R)
    extrude(amount=-F1_DEPTH)

    # F0 (on Top) → F2 (cut)
    with BuildSketch(Plane.XY):
        with BuildLine():
            Line((0, 0.71), (-3.2, 0.71))
            ThreePointArc((-3.2, 0.71), (-3.5550345175, 0.6148581067), (-3.8149178909, 0.3549309616))
            Line((-3.8149178909, 0.3549309616), (-4.6149178909, -1.0310690384))
            ThreePointArc((-4.6149178909, -1.0310690384), (-4.71, -1.386), (-4.6149178909, -1.7409309616))
            Line((-4.6149178909, -1.7409309616), (-3.8149178909, -3.1269309616))
            ThreePointArc((-3.8149178909, -3.1269309616), (-3.5550345175, -3.3868581067), (-3.2, -3.482))
            Line((-3.2, -3.482), (0, -3.482))
            ThreePointArc((0, -3.482), (0.5020458146, -3.2740458146), (0.71, -2.772))
            Line((0.71, -2.772), (0.71, 0))
            ThreePointArc((0.71, 0), (0.5020458146, 0.5020458146), (0, 0.71))
        make_face()
        with Locations((-3.2, -2.772)):
            Circle(F0_R, mode=Mode.SUBTRACT)
        with Locations((-4, -1.386)):
            Circle(F0_R, mode=Mode.SUBTRACT)
        with Locations((-2.4, -1.386)):
            Circle(F0_R, mode=Mode.SUBTRACT)
        with Locations((-1.6, -2.772)):
            Circle(F0_R, mode=Mode.SUBTRACT)
        with Locations((0, -2.772)):
            Circle(F0_R, mode=Mode.SUBTRACT)
        with Locations((-0.8, -1.386)):
            Circle(F0_R, mode=Mode.SUBTRACT)
        with Locations((-3.2, 0)):
            Circle(F0_R, mode=Mode.SUBTRACT)
        with Locations((-1.6, 0)):
            Circle(F0_R, mode=Mode.SUBTRACT)
        Circle(F0_R, mode=Mode.SUBTRACT)
        Circle(F0_R)
        with Locations((-0.8, -1.386)):
            Circle(F0_R)
        with Locations((0, -2.772)):
            Circle(F0_R)
        with Locations((-4, -1.386)):
            Circle(F0_R)
        with Locations((-2.4, -1.386)):
            Circle(F0_R)
        with Locations((-3.2, 0)):
            Circle(F0_R)
        with Locations((-1.6, 0)):
            Circle(F0_R)
        with Locations((-1.6, -2.772)):
            Circle(F0_R)
        with Locations((-3.2, -2.772)):
            Circle(F0_R)
    extrude(amount=-F2_DEPTH, mode=Mode.SUBTRACT)

    # F0 (on Top) → F3 (cut)
    with BuildSketch(Plane.XY):
        with Locations((-0.8, -1.386)):
            Circle(F0_R)
        Circle(F0_R)
        with Locations((0, -2.772)):
            Circle(F0_R)
        with Locations((-1.6, -2.772)):
            Circle(F0_R)
        with Locations((-3.2, -2.772)):
            Circle(F0_R)
        with Locations((-2.4, -1.386)):
            Circle(F0_R)
        with Locations((-1.6, 0)):
            Circle(F0_R)
        with Locations((-3.2, 0)):
            Circle(F0_R)
        with Locations((-4, -1.386)):
            Circle(F0_R)
    extrude(amount=-F3_DEPTH, mode=Mode.SUBTRACT)

    # F4 (on Top) → F5 (cut, through all)
    with BuildSketch(Plane.XY):
        with Locations((-3.2, 0)):
            Circle(F4_R)
        with Locations((-1.6, 0)):
            Circle(F4_R)
        Circle(F4_R)
        with Locations((-0.8, -1.386)):
            Circle(F4_R)
        with Locations((-2.4, -1.386)):
            Circle(F4_R)
        with Locations((-4, -1.386)):
            Circle(F4_R)
        with Locations((-3.2, -2.772)):
            Circle(F4_R)
        with Locations((-1.6, -2.772)):
            Circle(F4_R)
        with Locations((0, -2.772)):
            Circle(F4_R)
    extrude(amount=-F5_DEPTH, mode=Mode.SUBTRACT)


solid = f1.part
